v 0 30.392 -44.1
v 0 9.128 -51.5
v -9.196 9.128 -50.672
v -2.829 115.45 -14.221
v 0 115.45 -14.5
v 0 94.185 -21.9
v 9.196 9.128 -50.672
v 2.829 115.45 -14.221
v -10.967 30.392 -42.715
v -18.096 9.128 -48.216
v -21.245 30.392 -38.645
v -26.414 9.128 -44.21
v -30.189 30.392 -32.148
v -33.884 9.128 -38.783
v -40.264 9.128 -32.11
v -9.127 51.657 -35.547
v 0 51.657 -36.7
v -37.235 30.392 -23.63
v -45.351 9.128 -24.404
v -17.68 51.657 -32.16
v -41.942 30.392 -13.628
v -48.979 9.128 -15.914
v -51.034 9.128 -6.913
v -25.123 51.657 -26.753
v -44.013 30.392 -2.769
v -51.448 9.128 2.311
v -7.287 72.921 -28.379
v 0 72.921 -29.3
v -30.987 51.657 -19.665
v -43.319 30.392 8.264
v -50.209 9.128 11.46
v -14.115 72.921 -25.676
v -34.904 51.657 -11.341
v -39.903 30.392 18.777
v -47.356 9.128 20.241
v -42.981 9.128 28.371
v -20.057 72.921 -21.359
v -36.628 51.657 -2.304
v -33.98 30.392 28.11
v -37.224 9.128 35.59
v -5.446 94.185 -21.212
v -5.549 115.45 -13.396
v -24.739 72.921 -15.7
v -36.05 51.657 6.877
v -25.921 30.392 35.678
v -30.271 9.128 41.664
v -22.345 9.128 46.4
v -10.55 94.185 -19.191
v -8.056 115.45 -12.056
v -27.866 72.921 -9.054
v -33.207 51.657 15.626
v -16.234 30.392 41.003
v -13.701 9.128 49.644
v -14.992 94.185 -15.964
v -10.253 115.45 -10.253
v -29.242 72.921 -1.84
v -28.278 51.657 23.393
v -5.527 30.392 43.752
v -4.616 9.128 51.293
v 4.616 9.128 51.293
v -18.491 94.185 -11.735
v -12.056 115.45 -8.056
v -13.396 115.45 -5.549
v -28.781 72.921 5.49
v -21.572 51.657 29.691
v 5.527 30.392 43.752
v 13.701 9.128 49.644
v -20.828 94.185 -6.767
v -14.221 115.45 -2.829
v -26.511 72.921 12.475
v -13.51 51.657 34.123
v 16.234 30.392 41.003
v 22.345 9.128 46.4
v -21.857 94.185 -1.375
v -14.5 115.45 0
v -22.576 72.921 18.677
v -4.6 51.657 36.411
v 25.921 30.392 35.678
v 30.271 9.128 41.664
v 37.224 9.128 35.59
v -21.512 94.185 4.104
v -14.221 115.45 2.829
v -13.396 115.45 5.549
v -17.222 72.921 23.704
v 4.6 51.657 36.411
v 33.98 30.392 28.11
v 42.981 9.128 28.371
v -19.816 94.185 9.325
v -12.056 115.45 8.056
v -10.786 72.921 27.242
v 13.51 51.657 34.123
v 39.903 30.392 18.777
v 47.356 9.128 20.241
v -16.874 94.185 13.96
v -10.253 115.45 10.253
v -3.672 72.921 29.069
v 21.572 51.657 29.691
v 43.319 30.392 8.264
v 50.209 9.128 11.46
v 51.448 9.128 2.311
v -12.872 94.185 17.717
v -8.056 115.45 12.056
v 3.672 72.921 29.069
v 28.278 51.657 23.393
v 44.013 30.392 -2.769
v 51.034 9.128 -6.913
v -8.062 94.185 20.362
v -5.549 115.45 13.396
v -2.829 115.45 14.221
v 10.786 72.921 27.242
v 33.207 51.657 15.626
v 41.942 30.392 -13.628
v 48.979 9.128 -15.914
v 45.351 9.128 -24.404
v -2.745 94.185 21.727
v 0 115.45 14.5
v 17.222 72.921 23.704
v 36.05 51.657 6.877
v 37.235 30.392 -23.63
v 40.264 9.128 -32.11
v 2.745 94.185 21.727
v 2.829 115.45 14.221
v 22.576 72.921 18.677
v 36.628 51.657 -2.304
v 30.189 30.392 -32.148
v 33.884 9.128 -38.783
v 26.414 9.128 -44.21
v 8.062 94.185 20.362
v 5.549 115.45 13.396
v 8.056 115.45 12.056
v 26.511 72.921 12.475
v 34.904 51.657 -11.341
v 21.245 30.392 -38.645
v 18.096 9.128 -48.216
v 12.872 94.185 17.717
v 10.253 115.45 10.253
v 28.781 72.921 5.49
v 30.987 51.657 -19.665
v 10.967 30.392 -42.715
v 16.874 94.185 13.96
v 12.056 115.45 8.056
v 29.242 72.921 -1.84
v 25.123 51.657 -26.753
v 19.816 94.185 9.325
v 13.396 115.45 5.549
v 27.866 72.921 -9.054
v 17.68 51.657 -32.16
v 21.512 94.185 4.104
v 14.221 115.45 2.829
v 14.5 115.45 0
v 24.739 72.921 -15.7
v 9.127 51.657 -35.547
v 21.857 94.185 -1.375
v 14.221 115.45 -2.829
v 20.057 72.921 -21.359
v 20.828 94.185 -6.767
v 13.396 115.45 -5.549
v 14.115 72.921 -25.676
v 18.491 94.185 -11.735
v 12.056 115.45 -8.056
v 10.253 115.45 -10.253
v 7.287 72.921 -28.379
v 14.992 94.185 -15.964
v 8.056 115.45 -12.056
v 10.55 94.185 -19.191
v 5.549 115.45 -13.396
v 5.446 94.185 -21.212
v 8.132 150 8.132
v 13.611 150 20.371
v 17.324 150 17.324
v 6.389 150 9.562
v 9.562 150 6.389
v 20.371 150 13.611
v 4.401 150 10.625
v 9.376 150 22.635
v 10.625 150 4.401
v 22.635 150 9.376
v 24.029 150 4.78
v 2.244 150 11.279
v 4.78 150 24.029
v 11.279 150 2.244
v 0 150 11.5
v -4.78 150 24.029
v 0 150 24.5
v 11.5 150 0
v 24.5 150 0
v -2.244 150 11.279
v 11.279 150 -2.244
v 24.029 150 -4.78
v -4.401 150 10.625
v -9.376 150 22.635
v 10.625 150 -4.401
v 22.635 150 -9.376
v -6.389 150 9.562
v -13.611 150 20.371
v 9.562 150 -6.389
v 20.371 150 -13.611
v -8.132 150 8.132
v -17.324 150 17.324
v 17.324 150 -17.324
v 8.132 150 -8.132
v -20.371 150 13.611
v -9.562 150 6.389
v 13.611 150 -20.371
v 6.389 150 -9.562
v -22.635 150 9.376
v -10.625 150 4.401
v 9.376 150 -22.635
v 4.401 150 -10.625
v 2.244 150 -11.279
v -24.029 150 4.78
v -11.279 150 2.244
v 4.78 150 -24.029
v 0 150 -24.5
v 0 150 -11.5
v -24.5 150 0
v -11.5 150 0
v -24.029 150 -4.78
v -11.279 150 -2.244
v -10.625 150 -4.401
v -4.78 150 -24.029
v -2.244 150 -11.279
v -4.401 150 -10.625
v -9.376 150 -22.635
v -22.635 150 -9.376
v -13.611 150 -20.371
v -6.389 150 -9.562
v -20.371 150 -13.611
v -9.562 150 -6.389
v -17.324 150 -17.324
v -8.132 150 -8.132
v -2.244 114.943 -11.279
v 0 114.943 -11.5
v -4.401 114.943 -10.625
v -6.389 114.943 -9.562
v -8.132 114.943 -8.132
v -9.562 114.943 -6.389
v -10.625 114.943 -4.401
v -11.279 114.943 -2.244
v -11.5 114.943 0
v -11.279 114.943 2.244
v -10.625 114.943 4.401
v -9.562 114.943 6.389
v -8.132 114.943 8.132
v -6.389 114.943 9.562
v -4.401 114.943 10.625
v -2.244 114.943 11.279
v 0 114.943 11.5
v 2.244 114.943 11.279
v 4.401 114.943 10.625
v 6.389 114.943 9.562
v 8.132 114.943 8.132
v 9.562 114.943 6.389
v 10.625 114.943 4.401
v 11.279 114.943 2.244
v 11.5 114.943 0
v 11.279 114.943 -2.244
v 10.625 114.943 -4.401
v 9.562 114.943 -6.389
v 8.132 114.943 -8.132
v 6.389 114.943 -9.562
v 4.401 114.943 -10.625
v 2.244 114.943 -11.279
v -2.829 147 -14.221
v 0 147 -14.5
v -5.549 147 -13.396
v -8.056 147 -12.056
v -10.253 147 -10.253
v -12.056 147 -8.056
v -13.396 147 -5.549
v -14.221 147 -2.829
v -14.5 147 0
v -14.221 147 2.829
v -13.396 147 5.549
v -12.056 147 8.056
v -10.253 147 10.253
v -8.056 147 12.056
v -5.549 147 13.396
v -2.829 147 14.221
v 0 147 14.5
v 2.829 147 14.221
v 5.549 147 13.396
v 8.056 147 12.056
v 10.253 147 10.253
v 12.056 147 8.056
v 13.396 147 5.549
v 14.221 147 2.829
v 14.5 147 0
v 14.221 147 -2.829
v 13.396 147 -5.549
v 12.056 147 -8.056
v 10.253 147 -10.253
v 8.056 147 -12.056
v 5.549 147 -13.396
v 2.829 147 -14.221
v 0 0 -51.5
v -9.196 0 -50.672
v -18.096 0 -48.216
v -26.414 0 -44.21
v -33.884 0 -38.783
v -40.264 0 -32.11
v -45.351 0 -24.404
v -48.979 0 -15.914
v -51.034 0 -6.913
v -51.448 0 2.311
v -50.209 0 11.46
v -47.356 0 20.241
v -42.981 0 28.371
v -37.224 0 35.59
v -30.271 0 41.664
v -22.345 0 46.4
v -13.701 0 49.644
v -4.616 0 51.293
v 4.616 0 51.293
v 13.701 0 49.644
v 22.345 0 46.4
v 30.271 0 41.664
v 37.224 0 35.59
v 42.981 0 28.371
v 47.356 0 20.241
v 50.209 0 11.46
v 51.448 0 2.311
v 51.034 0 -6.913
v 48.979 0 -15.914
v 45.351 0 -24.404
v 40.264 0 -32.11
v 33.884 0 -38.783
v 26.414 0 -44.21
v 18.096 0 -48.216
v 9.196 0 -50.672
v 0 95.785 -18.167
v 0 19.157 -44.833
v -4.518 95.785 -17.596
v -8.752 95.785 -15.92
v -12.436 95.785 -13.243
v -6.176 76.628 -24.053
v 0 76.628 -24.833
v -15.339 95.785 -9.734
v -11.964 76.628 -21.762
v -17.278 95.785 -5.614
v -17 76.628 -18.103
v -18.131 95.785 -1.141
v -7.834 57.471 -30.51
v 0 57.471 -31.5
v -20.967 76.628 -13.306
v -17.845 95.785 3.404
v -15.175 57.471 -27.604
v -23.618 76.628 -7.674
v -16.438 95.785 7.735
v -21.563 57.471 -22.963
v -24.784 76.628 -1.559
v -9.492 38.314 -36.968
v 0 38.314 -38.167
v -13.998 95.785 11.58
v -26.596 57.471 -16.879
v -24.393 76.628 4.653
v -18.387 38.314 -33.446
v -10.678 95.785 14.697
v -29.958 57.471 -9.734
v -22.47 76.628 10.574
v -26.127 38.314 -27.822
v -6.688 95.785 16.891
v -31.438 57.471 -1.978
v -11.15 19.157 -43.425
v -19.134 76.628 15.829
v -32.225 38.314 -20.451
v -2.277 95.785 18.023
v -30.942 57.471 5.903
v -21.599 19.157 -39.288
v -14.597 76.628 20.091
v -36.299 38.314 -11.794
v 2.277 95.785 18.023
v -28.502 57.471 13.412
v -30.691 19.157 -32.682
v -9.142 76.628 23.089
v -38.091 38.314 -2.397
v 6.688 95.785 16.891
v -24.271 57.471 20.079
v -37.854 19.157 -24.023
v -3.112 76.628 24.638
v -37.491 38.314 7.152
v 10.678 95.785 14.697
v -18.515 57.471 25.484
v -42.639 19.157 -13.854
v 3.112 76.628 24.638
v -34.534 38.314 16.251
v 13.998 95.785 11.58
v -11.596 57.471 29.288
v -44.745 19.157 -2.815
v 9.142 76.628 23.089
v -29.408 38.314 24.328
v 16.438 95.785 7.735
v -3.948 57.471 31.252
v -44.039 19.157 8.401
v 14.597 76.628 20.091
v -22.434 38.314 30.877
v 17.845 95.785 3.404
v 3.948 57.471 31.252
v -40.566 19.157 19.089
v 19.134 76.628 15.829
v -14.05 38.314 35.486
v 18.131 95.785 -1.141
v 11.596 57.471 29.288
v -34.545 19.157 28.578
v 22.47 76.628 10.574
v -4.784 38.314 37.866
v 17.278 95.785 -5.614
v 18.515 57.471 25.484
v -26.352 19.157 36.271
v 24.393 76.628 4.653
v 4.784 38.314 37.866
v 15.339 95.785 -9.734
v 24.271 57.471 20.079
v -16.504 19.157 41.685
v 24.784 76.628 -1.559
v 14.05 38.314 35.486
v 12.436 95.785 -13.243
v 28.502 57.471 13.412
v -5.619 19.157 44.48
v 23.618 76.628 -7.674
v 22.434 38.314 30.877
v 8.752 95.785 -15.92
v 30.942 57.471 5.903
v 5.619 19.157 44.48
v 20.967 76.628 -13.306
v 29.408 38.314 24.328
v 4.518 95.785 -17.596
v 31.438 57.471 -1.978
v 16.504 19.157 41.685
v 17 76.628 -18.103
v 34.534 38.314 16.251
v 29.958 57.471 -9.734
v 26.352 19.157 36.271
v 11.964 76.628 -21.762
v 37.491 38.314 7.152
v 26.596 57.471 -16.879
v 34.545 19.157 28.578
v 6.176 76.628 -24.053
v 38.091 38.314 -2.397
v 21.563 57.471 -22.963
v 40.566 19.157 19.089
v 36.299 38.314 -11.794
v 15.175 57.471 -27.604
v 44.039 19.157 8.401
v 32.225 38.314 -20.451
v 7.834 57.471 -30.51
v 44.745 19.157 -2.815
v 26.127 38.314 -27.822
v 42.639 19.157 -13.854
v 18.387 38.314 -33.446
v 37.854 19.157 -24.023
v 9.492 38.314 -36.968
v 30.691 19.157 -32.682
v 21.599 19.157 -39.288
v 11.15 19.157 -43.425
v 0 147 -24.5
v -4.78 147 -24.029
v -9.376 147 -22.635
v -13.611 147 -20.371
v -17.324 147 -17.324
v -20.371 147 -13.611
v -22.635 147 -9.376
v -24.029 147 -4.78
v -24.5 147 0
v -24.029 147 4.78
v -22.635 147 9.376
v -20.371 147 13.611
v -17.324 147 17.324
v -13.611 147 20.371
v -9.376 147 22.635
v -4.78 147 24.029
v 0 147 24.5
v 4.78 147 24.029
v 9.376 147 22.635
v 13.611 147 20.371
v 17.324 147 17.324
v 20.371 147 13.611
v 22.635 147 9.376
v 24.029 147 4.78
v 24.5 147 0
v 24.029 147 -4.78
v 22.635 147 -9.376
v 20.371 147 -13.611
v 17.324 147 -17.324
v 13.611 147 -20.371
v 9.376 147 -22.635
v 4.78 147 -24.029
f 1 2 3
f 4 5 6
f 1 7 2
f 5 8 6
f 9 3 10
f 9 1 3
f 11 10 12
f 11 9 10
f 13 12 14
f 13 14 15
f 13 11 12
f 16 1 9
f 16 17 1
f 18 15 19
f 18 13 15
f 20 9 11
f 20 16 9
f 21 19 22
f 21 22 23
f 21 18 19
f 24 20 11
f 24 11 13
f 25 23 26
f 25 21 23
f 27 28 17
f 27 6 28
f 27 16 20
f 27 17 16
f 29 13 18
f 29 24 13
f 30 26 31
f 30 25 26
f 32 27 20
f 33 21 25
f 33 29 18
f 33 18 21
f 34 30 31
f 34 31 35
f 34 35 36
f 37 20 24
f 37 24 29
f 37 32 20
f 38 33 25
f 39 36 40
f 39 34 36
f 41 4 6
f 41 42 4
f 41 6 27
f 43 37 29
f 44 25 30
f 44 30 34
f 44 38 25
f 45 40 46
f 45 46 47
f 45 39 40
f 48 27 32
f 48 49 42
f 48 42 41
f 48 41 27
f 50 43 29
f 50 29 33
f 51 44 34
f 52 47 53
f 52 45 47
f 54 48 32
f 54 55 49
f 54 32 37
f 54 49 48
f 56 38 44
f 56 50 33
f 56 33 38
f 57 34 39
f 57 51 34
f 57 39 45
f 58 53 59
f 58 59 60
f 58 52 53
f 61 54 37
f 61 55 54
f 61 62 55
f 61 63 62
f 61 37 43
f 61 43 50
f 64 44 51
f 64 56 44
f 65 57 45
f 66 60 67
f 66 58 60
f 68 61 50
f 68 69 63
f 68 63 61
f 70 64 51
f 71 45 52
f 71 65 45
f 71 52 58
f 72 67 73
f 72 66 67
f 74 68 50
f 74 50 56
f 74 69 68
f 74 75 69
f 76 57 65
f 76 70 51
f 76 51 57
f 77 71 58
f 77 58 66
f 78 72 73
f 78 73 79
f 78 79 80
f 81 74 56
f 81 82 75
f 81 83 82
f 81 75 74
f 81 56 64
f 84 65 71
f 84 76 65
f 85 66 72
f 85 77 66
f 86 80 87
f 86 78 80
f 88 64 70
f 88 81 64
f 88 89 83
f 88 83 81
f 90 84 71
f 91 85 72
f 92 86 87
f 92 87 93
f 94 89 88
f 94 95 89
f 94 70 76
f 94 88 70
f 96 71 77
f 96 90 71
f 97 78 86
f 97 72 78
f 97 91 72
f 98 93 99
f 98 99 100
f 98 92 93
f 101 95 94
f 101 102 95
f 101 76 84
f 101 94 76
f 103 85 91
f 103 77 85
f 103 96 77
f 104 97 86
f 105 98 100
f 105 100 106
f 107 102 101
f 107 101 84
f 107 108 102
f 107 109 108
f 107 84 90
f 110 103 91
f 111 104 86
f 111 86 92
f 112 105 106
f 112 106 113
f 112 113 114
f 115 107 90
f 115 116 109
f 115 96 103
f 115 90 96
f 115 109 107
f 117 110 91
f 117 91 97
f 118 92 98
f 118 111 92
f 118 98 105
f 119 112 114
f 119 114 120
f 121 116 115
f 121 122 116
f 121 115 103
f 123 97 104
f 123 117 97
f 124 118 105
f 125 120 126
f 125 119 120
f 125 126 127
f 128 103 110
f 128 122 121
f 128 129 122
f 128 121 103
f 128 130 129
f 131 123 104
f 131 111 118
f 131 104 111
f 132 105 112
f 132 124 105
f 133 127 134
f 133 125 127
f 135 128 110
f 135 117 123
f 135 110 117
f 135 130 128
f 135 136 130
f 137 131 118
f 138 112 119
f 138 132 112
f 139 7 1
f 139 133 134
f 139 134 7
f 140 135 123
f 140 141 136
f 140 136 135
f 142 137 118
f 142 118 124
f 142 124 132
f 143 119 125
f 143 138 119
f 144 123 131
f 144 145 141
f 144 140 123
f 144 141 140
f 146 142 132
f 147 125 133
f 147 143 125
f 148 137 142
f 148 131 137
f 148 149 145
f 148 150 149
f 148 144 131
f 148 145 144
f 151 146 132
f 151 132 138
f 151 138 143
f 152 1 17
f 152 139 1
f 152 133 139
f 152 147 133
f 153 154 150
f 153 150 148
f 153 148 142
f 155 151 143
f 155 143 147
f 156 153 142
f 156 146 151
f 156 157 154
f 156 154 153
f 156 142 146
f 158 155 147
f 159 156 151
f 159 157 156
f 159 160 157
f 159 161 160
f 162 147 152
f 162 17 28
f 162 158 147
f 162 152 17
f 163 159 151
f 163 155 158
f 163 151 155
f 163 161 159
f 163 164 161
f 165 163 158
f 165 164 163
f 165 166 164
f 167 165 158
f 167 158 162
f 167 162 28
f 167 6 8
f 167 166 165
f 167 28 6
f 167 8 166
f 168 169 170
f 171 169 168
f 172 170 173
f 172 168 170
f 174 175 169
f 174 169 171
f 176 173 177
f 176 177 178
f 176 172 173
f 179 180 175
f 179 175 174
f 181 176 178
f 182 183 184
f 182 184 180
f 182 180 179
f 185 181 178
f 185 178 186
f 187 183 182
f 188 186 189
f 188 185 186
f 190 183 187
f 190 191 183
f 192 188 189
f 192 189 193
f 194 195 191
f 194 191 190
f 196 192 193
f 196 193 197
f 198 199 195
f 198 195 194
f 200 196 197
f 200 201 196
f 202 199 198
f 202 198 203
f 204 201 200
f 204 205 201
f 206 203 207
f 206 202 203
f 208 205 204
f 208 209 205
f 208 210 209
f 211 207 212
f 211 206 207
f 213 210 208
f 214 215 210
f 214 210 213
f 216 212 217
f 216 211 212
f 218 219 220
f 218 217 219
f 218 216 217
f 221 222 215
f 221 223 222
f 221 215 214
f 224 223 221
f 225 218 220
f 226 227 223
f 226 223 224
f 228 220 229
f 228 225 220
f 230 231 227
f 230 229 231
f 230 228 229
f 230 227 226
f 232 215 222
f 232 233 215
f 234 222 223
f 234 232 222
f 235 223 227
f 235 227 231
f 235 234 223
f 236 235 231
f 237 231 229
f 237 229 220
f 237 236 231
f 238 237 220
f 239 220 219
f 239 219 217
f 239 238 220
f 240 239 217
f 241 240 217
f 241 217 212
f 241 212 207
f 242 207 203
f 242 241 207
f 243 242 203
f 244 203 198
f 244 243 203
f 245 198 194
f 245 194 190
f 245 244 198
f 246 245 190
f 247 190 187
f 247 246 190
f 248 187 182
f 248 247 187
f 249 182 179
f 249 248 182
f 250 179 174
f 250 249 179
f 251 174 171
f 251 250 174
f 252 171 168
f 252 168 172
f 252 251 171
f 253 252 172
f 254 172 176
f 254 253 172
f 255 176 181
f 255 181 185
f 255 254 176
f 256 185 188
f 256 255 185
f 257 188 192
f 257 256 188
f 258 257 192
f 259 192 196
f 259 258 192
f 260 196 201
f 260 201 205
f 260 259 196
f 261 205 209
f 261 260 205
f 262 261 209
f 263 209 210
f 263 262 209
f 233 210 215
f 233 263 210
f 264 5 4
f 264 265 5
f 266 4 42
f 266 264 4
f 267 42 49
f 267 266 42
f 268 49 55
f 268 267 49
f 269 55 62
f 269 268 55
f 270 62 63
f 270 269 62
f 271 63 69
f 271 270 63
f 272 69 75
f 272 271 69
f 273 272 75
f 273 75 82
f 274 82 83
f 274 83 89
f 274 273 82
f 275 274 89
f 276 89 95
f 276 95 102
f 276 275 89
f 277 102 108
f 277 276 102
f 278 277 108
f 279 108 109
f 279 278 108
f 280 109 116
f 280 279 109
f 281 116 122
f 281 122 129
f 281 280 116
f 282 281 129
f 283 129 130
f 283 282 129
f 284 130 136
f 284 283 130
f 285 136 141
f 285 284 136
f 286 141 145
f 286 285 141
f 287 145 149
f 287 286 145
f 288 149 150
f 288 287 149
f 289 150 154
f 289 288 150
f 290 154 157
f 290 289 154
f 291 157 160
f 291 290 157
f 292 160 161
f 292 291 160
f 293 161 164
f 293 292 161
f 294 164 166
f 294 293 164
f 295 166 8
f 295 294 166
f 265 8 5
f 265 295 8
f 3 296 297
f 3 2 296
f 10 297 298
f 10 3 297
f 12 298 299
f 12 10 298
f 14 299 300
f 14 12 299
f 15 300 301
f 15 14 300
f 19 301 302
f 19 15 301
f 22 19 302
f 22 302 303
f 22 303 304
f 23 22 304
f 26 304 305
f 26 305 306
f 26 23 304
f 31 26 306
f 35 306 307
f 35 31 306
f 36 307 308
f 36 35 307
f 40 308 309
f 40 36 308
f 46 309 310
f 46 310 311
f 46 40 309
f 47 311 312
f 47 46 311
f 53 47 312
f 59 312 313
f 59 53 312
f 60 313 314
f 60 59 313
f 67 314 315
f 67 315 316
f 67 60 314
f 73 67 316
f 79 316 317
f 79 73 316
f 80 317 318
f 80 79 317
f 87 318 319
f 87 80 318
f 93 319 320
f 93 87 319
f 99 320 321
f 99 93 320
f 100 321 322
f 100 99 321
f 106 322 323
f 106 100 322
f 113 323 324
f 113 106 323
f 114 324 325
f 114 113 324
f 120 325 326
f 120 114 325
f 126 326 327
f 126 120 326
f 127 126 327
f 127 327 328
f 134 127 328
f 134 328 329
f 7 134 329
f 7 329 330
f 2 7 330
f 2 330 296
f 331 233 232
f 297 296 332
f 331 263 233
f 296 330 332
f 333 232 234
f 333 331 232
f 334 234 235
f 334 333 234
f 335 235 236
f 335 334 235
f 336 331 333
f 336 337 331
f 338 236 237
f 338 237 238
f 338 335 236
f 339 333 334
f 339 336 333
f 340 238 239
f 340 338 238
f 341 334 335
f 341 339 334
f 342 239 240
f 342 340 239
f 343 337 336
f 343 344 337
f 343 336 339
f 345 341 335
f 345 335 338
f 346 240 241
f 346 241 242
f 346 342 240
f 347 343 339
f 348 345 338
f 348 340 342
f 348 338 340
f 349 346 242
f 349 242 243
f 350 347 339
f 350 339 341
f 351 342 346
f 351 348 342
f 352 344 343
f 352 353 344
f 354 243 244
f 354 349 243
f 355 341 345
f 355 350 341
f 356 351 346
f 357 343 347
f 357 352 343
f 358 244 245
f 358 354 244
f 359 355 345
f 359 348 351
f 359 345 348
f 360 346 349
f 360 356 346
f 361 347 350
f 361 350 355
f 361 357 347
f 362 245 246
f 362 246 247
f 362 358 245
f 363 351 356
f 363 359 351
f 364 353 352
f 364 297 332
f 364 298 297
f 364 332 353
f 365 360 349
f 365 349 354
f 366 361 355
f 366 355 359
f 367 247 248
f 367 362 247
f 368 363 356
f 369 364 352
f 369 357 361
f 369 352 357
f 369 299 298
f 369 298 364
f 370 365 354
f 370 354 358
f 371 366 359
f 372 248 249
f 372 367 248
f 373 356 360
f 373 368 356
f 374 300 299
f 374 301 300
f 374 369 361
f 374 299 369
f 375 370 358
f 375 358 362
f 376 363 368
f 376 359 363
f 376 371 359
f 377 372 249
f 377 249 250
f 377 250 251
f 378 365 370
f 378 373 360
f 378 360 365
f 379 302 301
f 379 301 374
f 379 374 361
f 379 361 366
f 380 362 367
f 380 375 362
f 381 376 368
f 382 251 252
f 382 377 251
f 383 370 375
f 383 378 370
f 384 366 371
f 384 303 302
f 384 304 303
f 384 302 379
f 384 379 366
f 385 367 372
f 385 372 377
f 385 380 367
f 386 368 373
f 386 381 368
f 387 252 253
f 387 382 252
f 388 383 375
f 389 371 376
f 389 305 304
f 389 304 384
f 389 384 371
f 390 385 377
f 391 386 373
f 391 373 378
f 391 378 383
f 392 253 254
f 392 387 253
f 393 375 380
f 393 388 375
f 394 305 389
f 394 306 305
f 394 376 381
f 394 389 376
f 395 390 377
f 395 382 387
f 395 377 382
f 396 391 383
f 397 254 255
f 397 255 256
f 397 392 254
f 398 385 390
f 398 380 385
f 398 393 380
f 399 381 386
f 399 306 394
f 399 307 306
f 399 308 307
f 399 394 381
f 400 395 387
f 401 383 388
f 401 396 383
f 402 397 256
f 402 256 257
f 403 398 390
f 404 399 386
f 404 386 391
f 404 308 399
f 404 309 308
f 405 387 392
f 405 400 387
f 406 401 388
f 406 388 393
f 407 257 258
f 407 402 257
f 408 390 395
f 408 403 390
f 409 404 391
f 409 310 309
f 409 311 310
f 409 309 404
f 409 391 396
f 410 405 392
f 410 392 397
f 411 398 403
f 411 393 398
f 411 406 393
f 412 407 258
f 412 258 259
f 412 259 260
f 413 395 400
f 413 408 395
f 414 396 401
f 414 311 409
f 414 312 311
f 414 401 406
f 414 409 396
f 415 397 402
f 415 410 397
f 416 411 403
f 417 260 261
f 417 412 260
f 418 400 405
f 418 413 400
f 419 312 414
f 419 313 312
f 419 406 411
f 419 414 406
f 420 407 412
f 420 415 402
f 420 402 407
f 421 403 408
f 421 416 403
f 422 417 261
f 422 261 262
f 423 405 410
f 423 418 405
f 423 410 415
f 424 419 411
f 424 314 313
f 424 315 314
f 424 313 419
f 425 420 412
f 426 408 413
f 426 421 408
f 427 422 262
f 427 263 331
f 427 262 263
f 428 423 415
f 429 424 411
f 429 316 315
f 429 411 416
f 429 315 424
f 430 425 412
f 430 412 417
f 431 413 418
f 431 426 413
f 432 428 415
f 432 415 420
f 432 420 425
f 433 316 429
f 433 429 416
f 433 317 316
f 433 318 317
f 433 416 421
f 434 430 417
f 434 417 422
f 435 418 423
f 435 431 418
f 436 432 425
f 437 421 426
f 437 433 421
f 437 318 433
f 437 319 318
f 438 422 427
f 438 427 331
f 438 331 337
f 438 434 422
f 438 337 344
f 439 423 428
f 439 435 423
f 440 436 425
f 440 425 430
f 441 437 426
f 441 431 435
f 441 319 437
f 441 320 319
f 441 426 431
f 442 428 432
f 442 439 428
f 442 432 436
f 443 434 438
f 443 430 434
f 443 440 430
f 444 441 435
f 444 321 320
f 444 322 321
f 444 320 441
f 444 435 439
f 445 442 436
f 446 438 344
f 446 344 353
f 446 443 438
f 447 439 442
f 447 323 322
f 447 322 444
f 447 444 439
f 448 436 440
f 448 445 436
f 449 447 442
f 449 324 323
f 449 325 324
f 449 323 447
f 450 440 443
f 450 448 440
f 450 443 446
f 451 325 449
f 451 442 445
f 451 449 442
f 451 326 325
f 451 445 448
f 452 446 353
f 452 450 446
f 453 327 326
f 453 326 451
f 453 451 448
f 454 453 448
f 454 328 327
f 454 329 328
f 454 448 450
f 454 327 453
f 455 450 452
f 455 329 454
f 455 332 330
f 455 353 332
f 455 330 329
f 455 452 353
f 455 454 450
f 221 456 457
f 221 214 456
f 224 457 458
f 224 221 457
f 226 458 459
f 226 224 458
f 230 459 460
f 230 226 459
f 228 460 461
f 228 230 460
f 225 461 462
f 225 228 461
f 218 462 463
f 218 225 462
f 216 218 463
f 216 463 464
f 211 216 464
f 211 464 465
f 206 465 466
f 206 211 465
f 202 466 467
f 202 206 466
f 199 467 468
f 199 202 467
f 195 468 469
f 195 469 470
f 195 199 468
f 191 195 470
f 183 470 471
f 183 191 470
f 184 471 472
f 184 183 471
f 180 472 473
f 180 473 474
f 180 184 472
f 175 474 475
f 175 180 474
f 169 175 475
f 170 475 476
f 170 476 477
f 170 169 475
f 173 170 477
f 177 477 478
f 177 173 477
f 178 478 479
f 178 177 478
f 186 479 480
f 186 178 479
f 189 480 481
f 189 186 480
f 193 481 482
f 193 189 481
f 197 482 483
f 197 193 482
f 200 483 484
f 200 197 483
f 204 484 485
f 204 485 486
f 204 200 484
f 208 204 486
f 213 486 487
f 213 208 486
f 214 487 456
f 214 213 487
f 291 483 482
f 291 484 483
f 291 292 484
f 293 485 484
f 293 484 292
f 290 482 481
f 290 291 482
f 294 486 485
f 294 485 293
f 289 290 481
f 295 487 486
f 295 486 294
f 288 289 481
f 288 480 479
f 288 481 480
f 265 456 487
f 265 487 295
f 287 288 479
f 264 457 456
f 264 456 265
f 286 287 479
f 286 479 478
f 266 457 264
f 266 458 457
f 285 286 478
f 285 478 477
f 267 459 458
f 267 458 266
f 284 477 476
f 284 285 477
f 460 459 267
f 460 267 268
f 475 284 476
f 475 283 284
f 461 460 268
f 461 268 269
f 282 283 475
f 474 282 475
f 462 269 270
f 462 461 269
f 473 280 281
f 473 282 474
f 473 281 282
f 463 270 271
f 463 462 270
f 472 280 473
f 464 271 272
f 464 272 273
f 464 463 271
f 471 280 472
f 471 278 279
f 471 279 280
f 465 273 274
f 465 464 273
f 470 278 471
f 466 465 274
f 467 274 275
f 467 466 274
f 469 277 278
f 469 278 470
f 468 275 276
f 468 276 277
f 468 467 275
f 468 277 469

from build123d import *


with BuildPart() as part:
    # Sketch1 → Revolve1 (revolve)
    with BuildSketch(Plane.XY, mode=Mode.PRIVATE) as revolve1_sk:
        Polygon((11.5, 150), (11.5, 114.942528736), (51.5, 0), (51.5, 9.127775749), (14.5, 115.44961483), (14.5, 147), (24.5, 147), (24.5, 150), (14.5, 150), align=None)
    revolve(revolve1_sk.sketch.rotate(Axis((0, 0, 0), (0, 1, 0)), 90), axis=Axis((0, 0, 0), (0, 1, 0)))  # turned: the seam where the file's is


solid = part.part
